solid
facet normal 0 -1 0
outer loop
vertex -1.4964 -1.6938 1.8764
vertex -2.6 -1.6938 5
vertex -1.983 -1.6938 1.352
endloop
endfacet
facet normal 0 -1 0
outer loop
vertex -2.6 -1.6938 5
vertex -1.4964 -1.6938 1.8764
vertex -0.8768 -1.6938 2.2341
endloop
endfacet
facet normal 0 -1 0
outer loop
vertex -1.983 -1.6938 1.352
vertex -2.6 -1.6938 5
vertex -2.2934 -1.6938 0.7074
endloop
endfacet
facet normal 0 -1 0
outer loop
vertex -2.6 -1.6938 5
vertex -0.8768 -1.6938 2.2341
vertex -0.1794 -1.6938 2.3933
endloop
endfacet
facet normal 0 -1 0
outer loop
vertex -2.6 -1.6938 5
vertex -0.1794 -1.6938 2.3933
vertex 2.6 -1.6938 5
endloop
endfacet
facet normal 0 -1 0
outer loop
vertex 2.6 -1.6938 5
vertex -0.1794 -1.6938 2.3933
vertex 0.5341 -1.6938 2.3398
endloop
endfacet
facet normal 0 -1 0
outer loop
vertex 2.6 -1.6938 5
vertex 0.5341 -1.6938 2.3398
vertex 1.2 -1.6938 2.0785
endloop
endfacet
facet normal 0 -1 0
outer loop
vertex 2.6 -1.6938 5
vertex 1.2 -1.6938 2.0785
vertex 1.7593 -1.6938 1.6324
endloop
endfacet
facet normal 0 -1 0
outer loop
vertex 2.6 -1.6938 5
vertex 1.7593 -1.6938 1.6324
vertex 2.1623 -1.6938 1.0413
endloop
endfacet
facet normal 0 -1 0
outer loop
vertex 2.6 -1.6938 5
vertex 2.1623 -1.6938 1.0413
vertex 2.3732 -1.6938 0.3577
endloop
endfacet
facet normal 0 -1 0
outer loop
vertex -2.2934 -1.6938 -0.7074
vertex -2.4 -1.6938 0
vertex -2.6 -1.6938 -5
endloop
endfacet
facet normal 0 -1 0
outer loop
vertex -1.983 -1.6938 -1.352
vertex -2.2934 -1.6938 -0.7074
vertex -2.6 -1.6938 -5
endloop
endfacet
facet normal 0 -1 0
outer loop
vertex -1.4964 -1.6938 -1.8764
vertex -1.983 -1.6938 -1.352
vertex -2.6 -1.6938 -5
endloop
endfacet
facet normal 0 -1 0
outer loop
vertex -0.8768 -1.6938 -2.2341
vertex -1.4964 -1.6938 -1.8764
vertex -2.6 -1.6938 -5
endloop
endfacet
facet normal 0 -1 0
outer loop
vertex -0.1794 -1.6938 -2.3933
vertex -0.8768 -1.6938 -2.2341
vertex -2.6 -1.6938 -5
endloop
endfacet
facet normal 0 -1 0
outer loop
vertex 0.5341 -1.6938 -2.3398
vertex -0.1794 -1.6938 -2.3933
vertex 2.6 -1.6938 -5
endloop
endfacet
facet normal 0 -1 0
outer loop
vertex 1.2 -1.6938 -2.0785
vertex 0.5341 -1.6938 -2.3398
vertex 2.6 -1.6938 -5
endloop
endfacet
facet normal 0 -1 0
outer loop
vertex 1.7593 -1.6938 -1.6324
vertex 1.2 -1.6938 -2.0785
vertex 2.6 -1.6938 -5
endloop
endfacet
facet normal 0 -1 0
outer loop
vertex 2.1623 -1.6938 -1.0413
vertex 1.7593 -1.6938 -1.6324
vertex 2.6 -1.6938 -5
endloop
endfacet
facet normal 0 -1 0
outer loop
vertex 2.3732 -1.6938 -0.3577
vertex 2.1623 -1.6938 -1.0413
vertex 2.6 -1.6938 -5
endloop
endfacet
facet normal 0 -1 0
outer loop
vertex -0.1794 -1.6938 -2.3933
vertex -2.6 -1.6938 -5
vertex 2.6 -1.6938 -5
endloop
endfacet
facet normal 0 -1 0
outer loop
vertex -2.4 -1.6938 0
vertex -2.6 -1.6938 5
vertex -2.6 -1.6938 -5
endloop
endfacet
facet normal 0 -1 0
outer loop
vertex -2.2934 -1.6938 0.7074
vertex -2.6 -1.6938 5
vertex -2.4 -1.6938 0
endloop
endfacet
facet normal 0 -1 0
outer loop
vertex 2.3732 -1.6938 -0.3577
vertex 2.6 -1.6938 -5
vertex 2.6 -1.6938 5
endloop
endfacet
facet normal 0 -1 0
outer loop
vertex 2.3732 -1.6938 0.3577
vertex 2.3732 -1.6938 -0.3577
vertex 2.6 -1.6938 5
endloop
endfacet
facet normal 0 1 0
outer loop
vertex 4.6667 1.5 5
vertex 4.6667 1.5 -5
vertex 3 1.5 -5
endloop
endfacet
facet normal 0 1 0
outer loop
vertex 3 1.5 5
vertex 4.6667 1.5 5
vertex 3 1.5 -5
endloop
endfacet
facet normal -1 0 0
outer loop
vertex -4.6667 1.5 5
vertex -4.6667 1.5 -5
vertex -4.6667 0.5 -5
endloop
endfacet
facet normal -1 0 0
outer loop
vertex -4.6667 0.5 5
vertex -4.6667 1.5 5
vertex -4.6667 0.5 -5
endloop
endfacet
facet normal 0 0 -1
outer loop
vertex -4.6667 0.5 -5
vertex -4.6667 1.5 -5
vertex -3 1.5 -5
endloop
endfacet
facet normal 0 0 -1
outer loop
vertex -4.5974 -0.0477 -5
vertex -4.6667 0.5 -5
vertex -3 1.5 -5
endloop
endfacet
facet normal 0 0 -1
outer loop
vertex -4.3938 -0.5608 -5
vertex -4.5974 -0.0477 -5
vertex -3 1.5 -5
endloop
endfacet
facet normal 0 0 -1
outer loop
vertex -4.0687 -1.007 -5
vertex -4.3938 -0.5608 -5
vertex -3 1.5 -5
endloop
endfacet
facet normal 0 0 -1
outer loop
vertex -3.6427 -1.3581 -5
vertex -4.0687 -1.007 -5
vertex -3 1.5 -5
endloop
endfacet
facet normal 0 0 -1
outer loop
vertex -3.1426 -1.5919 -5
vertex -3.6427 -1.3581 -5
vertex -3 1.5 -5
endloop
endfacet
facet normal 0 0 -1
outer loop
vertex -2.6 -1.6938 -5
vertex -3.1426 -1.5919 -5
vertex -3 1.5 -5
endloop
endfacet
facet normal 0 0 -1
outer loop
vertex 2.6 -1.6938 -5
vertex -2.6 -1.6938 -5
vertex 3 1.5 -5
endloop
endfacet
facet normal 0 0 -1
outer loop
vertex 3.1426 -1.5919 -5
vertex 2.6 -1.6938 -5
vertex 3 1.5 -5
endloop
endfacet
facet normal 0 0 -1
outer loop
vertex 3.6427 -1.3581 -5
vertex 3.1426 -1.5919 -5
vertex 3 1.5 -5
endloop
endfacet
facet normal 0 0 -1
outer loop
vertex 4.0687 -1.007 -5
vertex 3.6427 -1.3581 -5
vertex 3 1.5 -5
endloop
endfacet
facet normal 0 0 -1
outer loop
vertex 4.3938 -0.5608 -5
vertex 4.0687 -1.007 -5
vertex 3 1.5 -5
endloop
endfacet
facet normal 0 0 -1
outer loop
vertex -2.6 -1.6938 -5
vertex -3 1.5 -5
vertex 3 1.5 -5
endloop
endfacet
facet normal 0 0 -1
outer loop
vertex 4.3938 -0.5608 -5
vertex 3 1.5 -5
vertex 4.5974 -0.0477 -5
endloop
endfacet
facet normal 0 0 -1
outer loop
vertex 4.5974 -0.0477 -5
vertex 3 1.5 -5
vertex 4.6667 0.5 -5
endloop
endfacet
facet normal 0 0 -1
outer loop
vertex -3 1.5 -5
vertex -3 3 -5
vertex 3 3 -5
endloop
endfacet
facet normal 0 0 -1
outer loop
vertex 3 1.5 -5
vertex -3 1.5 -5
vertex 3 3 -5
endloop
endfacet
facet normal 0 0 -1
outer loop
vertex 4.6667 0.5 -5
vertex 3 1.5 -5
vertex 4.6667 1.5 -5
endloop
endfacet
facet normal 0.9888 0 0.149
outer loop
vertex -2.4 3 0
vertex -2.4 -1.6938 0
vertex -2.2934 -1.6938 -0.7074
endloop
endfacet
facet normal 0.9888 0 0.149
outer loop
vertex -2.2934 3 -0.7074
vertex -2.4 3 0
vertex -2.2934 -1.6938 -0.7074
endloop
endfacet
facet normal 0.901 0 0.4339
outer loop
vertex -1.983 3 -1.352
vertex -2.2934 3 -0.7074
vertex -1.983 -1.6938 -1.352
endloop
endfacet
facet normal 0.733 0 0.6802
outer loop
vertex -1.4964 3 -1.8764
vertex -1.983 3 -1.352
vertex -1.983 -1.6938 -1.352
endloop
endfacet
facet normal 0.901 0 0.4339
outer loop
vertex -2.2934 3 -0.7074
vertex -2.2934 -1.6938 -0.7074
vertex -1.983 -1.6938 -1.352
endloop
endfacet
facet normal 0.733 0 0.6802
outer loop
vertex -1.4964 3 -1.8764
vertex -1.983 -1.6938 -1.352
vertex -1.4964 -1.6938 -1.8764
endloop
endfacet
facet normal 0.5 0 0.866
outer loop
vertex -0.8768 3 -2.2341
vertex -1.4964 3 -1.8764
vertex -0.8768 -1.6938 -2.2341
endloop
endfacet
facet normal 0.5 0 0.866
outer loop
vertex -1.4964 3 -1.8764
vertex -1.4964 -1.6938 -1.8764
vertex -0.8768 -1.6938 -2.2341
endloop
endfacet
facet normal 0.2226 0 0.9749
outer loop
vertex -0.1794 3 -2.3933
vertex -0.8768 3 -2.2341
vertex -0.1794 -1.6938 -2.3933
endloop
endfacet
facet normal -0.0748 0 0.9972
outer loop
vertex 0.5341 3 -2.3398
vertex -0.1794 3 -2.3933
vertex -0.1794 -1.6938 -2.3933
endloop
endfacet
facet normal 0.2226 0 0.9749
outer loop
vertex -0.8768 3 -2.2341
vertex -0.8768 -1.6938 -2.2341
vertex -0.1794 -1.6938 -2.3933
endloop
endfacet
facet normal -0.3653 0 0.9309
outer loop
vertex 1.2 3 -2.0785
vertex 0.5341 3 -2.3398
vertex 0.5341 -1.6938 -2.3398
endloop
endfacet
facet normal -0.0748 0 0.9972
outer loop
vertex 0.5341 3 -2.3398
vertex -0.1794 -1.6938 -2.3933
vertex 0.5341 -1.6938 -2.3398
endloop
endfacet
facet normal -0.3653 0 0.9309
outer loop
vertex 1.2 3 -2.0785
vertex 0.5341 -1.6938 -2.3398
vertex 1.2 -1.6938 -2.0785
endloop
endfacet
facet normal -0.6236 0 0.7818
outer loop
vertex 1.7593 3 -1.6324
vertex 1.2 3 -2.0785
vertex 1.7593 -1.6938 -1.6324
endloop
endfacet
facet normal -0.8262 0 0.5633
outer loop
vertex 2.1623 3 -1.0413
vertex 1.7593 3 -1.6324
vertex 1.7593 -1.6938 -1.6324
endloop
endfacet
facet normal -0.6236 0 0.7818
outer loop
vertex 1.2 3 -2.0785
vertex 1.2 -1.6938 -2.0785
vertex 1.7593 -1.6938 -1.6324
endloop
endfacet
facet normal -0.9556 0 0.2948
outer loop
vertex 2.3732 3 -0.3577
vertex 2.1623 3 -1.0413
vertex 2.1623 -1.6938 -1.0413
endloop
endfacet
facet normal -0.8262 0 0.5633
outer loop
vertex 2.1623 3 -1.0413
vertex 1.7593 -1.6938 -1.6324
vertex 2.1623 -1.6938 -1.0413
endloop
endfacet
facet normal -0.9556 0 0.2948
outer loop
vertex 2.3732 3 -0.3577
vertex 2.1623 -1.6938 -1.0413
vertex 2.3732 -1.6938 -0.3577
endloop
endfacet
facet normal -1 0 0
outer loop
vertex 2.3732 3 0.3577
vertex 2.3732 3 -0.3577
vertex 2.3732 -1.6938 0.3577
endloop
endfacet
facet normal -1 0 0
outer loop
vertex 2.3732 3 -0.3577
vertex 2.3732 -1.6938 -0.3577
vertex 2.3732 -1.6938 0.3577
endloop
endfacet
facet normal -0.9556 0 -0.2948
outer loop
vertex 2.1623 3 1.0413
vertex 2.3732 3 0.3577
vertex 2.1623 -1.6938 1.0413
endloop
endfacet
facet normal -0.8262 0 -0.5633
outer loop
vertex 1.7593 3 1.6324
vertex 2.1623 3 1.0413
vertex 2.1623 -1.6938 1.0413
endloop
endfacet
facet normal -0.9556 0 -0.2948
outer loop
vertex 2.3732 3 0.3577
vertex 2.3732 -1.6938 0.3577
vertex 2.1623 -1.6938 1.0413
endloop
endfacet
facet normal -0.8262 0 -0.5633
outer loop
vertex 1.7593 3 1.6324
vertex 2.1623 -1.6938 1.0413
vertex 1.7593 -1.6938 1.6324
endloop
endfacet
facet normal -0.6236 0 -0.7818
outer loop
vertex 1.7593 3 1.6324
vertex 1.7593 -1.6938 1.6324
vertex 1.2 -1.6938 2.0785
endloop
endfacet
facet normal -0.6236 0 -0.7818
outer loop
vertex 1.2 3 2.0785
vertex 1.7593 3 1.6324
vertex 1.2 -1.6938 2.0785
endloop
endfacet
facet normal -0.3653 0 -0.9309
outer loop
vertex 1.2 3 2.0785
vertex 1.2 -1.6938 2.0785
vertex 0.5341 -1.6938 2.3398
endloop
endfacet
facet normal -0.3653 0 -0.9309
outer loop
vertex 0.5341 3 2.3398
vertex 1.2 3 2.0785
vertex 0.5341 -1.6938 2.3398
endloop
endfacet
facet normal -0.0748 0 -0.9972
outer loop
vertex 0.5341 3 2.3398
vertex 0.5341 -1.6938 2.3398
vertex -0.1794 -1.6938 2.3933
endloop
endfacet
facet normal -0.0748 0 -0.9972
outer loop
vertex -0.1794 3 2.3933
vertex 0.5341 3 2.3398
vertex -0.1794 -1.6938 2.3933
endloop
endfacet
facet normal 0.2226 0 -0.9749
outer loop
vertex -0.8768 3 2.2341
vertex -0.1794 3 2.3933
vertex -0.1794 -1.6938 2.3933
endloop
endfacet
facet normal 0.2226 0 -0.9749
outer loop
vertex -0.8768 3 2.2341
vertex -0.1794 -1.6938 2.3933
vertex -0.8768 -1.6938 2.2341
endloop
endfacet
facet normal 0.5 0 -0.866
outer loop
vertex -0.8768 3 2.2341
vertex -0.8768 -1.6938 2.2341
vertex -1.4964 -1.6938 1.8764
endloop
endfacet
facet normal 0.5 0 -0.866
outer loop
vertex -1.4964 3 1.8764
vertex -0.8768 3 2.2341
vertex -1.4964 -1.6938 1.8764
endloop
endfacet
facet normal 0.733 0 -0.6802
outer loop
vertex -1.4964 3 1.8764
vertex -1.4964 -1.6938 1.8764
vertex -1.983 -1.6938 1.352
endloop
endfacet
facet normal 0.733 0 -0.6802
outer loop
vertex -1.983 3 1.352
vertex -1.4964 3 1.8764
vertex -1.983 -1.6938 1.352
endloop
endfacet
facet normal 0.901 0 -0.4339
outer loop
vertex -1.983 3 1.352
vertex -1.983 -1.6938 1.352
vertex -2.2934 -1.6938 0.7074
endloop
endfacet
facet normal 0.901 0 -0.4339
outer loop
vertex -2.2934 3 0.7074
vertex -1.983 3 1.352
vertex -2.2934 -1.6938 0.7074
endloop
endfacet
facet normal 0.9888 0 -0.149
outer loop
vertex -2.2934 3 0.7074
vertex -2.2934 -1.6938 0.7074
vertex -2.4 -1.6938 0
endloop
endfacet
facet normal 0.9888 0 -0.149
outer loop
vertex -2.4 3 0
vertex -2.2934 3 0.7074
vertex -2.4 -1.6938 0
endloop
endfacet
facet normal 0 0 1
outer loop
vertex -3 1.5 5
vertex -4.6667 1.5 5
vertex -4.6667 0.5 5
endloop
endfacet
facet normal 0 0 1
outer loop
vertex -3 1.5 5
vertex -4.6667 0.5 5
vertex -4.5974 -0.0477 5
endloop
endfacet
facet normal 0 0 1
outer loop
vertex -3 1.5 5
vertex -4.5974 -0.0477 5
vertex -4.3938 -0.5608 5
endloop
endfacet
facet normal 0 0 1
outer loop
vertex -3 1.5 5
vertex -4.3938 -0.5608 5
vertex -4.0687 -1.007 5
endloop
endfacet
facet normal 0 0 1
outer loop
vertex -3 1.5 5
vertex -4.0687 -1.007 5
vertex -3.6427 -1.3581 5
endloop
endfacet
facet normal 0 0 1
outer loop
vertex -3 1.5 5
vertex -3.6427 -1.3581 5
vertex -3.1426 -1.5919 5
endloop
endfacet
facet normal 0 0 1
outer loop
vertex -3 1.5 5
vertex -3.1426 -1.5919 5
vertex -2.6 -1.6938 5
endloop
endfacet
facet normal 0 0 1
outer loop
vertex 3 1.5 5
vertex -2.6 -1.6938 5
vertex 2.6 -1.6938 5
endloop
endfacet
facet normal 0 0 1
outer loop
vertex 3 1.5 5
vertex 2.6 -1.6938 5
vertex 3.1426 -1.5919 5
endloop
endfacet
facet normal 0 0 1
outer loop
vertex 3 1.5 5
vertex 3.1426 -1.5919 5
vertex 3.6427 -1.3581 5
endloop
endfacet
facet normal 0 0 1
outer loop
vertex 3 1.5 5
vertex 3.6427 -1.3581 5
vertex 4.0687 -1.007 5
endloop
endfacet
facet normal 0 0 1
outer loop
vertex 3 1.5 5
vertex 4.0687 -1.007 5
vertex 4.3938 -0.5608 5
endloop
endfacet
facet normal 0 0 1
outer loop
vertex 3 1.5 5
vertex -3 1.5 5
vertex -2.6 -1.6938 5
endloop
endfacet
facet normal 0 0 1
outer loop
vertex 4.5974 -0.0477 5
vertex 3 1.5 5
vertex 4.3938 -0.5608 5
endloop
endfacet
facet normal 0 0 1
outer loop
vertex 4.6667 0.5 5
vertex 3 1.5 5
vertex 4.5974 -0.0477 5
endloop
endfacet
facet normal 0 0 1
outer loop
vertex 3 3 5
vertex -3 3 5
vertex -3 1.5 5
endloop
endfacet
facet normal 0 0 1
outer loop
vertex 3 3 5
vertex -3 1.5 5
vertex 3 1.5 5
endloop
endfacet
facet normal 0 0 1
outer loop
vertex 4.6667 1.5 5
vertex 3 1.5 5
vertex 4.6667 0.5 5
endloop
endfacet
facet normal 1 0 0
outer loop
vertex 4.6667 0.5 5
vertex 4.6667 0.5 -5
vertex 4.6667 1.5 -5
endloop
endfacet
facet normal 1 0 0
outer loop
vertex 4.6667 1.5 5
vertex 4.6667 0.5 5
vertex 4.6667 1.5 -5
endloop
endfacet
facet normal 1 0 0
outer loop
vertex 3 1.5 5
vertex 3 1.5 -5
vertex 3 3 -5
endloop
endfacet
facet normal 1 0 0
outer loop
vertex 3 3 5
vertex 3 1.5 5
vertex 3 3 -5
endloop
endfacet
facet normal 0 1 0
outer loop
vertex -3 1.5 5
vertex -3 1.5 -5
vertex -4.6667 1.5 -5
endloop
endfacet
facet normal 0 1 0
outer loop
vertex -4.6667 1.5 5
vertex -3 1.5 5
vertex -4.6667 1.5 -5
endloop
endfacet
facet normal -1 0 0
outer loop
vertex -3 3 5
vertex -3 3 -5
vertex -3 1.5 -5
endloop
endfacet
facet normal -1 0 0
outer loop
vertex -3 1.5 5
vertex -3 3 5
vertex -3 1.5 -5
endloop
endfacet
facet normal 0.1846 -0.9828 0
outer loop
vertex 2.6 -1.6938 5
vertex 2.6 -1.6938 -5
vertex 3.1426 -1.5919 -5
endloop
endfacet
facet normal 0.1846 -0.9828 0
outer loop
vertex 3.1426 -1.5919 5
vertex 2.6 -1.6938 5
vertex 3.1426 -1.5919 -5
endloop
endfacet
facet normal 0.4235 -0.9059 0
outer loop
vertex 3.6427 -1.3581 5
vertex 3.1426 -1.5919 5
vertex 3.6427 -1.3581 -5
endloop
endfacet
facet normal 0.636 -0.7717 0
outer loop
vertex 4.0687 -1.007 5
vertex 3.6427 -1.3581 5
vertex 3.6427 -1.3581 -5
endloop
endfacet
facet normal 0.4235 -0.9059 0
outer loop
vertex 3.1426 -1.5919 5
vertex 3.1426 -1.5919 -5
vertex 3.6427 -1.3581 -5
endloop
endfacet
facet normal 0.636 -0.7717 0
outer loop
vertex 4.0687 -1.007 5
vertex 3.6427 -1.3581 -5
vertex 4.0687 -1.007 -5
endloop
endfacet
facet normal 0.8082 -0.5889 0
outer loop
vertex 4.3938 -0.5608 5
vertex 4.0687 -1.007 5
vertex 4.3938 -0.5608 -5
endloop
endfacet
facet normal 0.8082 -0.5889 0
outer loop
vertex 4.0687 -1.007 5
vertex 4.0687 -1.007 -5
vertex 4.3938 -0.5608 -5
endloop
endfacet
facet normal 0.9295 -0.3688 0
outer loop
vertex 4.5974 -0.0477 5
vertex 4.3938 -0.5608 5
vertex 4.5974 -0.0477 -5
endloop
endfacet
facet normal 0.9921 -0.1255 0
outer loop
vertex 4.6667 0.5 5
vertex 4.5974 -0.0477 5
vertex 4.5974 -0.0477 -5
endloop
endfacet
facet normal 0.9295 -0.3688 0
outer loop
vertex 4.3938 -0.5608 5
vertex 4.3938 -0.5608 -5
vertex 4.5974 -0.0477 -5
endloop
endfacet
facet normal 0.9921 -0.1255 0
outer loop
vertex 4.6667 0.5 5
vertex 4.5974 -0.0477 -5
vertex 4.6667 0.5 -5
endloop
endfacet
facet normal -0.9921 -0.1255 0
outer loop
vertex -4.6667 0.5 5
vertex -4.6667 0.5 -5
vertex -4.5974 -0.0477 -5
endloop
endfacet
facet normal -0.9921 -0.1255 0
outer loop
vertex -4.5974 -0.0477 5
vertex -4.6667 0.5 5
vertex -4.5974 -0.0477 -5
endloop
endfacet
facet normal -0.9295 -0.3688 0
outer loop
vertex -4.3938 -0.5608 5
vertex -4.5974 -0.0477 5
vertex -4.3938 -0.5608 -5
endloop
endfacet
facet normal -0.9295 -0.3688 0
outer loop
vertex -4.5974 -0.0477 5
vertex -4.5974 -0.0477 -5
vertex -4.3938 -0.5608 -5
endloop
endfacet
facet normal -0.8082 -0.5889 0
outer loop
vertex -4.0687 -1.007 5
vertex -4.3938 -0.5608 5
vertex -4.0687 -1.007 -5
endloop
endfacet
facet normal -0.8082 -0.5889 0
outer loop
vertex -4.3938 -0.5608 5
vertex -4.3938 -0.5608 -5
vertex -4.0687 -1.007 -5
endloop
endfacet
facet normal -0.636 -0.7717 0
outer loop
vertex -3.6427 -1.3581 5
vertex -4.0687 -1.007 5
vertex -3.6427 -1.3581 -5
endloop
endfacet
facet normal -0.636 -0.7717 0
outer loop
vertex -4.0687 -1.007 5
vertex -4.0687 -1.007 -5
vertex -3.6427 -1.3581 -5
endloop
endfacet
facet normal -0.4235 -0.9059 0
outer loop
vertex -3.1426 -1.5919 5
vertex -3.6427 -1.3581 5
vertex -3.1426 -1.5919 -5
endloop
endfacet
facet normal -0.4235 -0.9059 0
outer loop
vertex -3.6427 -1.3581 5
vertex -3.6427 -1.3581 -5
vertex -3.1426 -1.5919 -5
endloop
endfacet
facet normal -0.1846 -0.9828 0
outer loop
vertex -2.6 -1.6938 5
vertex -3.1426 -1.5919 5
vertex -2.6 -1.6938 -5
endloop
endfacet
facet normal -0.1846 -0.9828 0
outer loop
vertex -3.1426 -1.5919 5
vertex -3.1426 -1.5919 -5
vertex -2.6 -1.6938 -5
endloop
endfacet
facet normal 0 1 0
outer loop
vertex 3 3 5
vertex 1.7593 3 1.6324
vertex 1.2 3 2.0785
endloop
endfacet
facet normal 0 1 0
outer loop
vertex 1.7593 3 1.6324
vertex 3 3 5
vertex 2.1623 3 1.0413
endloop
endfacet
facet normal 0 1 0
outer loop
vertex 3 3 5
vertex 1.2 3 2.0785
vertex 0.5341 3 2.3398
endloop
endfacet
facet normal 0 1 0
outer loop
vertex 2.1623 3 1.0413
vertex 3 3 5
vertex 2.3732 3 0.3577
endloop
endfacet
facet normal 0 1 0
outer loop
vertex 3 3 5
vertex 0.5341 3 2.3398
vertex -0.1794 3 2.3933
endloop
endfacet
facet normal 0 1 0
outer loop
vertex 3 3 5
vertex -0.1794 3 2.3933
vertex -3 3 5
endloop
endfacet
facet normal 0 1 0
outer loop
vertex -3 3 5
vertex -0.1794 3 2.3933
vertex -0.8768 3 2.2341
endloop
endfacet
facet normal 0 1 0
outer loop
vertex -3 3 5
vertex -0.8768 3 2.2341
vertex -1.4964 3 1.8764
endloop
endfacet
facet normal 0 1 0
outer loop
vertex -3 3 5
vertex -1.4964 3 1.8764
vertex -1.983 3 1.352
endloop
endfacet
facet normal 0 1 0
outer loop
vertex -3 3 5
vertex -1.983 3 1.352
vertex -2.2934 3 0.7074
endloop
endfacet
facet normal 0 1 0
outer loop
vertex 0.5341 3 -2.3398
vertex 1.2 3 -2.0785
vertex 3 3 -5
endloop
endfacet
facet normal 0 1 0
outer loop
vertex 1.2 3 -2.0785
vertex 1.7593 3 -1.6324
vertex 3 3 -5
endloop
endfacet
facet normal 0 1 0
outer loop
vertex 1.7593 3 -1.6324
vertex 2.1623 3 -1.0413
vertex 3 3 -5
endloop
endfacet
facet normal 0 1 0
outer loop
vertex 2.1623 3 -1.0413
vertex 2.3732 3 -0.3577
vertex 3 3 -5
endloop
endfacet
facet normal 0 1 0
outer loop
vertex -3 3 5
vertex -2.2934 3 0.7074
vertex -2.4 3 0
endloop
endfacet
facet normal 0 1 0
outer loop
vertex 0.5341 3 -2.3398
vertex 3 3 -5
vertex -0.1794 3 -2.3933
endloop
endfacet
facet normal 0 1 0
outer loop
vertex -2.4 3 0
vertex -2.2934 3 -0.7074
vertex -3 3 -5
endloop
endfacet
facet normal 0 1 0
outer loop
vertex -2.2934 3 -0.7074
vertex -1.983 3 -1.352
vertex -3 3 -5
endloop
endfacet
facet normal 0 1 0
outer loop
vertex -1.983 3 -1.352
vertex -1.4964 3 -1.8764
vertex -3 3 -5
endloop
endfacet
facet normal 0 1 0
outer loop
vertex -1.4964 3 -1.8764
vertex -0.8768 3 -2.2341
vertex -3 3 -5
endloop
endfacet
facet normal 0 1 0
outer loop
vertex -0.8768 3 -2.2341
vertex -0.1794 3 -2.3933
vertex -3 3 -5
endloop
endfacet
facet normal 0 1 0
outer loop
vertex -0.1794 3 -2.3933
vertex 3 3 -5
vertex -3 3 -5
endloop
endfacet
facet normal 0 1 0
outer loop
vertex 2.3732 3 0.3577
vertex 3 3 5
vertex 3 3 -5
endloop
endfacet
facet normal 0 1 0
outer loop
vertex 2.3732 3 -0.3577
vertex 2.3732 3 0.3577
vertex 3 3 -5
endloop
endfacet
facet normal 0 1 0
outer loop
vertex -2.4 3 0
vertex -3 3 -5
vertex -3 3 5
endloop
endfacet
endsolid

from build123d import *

# Parameters (mm, degrees)
EXTRUDE_1_DEPTH    = 10
HOLE_WIZARD_M6_4_D = 4.8


with BuildPart() as part:
    # 草图1 → 凸台-拉伸1 (new body)
    with BuildSketch(Plane.XY):
        with BuildLine():
            Line((3, 3), (-3, 3))
            Line((-3, 3), (-3, 1.5))
            Line((-3, 1.5), (-4.666746731, 1.5))
            Line((-4.666746731, 1.5), (-4.666746731, 0.5))
            ThreePointArc((-4.666746731, 0.5), (-4.068683171, -1.006990331), (-2.6, -1.69377241))
            Line((-2.6, -1.69377241), (2.6, -1.69377241))
            ThreePointArc((2.6, -1.69377241), (4.068683171, -1.006990331), (4.666746731, 0.5))
            Line((4.666746731, 0.5), (4.666746731, 1.5))
            Line((4.666746731, 1.5), (3, 1.5))
            Line((3, 1.5), (3, 3))
        make_face()
    extrude(amount=EXTRUDE_1_DEPTH)

    # M6 螺纹孔4 (through all)
    with Locations(Plane(origin=(0, 3, 0), x_dir=(1, 0, 0), z_dir=(0, 1, 0))):
        with Locations((0, -5)):
            Hole(HOLE_WIZARD_M6_4_D / 2)


with BuildPart() as part_1:
    # Move Body 1: moved
    add(part.part.moved(Location((0, 0, -5))))


solid = part_1.part
